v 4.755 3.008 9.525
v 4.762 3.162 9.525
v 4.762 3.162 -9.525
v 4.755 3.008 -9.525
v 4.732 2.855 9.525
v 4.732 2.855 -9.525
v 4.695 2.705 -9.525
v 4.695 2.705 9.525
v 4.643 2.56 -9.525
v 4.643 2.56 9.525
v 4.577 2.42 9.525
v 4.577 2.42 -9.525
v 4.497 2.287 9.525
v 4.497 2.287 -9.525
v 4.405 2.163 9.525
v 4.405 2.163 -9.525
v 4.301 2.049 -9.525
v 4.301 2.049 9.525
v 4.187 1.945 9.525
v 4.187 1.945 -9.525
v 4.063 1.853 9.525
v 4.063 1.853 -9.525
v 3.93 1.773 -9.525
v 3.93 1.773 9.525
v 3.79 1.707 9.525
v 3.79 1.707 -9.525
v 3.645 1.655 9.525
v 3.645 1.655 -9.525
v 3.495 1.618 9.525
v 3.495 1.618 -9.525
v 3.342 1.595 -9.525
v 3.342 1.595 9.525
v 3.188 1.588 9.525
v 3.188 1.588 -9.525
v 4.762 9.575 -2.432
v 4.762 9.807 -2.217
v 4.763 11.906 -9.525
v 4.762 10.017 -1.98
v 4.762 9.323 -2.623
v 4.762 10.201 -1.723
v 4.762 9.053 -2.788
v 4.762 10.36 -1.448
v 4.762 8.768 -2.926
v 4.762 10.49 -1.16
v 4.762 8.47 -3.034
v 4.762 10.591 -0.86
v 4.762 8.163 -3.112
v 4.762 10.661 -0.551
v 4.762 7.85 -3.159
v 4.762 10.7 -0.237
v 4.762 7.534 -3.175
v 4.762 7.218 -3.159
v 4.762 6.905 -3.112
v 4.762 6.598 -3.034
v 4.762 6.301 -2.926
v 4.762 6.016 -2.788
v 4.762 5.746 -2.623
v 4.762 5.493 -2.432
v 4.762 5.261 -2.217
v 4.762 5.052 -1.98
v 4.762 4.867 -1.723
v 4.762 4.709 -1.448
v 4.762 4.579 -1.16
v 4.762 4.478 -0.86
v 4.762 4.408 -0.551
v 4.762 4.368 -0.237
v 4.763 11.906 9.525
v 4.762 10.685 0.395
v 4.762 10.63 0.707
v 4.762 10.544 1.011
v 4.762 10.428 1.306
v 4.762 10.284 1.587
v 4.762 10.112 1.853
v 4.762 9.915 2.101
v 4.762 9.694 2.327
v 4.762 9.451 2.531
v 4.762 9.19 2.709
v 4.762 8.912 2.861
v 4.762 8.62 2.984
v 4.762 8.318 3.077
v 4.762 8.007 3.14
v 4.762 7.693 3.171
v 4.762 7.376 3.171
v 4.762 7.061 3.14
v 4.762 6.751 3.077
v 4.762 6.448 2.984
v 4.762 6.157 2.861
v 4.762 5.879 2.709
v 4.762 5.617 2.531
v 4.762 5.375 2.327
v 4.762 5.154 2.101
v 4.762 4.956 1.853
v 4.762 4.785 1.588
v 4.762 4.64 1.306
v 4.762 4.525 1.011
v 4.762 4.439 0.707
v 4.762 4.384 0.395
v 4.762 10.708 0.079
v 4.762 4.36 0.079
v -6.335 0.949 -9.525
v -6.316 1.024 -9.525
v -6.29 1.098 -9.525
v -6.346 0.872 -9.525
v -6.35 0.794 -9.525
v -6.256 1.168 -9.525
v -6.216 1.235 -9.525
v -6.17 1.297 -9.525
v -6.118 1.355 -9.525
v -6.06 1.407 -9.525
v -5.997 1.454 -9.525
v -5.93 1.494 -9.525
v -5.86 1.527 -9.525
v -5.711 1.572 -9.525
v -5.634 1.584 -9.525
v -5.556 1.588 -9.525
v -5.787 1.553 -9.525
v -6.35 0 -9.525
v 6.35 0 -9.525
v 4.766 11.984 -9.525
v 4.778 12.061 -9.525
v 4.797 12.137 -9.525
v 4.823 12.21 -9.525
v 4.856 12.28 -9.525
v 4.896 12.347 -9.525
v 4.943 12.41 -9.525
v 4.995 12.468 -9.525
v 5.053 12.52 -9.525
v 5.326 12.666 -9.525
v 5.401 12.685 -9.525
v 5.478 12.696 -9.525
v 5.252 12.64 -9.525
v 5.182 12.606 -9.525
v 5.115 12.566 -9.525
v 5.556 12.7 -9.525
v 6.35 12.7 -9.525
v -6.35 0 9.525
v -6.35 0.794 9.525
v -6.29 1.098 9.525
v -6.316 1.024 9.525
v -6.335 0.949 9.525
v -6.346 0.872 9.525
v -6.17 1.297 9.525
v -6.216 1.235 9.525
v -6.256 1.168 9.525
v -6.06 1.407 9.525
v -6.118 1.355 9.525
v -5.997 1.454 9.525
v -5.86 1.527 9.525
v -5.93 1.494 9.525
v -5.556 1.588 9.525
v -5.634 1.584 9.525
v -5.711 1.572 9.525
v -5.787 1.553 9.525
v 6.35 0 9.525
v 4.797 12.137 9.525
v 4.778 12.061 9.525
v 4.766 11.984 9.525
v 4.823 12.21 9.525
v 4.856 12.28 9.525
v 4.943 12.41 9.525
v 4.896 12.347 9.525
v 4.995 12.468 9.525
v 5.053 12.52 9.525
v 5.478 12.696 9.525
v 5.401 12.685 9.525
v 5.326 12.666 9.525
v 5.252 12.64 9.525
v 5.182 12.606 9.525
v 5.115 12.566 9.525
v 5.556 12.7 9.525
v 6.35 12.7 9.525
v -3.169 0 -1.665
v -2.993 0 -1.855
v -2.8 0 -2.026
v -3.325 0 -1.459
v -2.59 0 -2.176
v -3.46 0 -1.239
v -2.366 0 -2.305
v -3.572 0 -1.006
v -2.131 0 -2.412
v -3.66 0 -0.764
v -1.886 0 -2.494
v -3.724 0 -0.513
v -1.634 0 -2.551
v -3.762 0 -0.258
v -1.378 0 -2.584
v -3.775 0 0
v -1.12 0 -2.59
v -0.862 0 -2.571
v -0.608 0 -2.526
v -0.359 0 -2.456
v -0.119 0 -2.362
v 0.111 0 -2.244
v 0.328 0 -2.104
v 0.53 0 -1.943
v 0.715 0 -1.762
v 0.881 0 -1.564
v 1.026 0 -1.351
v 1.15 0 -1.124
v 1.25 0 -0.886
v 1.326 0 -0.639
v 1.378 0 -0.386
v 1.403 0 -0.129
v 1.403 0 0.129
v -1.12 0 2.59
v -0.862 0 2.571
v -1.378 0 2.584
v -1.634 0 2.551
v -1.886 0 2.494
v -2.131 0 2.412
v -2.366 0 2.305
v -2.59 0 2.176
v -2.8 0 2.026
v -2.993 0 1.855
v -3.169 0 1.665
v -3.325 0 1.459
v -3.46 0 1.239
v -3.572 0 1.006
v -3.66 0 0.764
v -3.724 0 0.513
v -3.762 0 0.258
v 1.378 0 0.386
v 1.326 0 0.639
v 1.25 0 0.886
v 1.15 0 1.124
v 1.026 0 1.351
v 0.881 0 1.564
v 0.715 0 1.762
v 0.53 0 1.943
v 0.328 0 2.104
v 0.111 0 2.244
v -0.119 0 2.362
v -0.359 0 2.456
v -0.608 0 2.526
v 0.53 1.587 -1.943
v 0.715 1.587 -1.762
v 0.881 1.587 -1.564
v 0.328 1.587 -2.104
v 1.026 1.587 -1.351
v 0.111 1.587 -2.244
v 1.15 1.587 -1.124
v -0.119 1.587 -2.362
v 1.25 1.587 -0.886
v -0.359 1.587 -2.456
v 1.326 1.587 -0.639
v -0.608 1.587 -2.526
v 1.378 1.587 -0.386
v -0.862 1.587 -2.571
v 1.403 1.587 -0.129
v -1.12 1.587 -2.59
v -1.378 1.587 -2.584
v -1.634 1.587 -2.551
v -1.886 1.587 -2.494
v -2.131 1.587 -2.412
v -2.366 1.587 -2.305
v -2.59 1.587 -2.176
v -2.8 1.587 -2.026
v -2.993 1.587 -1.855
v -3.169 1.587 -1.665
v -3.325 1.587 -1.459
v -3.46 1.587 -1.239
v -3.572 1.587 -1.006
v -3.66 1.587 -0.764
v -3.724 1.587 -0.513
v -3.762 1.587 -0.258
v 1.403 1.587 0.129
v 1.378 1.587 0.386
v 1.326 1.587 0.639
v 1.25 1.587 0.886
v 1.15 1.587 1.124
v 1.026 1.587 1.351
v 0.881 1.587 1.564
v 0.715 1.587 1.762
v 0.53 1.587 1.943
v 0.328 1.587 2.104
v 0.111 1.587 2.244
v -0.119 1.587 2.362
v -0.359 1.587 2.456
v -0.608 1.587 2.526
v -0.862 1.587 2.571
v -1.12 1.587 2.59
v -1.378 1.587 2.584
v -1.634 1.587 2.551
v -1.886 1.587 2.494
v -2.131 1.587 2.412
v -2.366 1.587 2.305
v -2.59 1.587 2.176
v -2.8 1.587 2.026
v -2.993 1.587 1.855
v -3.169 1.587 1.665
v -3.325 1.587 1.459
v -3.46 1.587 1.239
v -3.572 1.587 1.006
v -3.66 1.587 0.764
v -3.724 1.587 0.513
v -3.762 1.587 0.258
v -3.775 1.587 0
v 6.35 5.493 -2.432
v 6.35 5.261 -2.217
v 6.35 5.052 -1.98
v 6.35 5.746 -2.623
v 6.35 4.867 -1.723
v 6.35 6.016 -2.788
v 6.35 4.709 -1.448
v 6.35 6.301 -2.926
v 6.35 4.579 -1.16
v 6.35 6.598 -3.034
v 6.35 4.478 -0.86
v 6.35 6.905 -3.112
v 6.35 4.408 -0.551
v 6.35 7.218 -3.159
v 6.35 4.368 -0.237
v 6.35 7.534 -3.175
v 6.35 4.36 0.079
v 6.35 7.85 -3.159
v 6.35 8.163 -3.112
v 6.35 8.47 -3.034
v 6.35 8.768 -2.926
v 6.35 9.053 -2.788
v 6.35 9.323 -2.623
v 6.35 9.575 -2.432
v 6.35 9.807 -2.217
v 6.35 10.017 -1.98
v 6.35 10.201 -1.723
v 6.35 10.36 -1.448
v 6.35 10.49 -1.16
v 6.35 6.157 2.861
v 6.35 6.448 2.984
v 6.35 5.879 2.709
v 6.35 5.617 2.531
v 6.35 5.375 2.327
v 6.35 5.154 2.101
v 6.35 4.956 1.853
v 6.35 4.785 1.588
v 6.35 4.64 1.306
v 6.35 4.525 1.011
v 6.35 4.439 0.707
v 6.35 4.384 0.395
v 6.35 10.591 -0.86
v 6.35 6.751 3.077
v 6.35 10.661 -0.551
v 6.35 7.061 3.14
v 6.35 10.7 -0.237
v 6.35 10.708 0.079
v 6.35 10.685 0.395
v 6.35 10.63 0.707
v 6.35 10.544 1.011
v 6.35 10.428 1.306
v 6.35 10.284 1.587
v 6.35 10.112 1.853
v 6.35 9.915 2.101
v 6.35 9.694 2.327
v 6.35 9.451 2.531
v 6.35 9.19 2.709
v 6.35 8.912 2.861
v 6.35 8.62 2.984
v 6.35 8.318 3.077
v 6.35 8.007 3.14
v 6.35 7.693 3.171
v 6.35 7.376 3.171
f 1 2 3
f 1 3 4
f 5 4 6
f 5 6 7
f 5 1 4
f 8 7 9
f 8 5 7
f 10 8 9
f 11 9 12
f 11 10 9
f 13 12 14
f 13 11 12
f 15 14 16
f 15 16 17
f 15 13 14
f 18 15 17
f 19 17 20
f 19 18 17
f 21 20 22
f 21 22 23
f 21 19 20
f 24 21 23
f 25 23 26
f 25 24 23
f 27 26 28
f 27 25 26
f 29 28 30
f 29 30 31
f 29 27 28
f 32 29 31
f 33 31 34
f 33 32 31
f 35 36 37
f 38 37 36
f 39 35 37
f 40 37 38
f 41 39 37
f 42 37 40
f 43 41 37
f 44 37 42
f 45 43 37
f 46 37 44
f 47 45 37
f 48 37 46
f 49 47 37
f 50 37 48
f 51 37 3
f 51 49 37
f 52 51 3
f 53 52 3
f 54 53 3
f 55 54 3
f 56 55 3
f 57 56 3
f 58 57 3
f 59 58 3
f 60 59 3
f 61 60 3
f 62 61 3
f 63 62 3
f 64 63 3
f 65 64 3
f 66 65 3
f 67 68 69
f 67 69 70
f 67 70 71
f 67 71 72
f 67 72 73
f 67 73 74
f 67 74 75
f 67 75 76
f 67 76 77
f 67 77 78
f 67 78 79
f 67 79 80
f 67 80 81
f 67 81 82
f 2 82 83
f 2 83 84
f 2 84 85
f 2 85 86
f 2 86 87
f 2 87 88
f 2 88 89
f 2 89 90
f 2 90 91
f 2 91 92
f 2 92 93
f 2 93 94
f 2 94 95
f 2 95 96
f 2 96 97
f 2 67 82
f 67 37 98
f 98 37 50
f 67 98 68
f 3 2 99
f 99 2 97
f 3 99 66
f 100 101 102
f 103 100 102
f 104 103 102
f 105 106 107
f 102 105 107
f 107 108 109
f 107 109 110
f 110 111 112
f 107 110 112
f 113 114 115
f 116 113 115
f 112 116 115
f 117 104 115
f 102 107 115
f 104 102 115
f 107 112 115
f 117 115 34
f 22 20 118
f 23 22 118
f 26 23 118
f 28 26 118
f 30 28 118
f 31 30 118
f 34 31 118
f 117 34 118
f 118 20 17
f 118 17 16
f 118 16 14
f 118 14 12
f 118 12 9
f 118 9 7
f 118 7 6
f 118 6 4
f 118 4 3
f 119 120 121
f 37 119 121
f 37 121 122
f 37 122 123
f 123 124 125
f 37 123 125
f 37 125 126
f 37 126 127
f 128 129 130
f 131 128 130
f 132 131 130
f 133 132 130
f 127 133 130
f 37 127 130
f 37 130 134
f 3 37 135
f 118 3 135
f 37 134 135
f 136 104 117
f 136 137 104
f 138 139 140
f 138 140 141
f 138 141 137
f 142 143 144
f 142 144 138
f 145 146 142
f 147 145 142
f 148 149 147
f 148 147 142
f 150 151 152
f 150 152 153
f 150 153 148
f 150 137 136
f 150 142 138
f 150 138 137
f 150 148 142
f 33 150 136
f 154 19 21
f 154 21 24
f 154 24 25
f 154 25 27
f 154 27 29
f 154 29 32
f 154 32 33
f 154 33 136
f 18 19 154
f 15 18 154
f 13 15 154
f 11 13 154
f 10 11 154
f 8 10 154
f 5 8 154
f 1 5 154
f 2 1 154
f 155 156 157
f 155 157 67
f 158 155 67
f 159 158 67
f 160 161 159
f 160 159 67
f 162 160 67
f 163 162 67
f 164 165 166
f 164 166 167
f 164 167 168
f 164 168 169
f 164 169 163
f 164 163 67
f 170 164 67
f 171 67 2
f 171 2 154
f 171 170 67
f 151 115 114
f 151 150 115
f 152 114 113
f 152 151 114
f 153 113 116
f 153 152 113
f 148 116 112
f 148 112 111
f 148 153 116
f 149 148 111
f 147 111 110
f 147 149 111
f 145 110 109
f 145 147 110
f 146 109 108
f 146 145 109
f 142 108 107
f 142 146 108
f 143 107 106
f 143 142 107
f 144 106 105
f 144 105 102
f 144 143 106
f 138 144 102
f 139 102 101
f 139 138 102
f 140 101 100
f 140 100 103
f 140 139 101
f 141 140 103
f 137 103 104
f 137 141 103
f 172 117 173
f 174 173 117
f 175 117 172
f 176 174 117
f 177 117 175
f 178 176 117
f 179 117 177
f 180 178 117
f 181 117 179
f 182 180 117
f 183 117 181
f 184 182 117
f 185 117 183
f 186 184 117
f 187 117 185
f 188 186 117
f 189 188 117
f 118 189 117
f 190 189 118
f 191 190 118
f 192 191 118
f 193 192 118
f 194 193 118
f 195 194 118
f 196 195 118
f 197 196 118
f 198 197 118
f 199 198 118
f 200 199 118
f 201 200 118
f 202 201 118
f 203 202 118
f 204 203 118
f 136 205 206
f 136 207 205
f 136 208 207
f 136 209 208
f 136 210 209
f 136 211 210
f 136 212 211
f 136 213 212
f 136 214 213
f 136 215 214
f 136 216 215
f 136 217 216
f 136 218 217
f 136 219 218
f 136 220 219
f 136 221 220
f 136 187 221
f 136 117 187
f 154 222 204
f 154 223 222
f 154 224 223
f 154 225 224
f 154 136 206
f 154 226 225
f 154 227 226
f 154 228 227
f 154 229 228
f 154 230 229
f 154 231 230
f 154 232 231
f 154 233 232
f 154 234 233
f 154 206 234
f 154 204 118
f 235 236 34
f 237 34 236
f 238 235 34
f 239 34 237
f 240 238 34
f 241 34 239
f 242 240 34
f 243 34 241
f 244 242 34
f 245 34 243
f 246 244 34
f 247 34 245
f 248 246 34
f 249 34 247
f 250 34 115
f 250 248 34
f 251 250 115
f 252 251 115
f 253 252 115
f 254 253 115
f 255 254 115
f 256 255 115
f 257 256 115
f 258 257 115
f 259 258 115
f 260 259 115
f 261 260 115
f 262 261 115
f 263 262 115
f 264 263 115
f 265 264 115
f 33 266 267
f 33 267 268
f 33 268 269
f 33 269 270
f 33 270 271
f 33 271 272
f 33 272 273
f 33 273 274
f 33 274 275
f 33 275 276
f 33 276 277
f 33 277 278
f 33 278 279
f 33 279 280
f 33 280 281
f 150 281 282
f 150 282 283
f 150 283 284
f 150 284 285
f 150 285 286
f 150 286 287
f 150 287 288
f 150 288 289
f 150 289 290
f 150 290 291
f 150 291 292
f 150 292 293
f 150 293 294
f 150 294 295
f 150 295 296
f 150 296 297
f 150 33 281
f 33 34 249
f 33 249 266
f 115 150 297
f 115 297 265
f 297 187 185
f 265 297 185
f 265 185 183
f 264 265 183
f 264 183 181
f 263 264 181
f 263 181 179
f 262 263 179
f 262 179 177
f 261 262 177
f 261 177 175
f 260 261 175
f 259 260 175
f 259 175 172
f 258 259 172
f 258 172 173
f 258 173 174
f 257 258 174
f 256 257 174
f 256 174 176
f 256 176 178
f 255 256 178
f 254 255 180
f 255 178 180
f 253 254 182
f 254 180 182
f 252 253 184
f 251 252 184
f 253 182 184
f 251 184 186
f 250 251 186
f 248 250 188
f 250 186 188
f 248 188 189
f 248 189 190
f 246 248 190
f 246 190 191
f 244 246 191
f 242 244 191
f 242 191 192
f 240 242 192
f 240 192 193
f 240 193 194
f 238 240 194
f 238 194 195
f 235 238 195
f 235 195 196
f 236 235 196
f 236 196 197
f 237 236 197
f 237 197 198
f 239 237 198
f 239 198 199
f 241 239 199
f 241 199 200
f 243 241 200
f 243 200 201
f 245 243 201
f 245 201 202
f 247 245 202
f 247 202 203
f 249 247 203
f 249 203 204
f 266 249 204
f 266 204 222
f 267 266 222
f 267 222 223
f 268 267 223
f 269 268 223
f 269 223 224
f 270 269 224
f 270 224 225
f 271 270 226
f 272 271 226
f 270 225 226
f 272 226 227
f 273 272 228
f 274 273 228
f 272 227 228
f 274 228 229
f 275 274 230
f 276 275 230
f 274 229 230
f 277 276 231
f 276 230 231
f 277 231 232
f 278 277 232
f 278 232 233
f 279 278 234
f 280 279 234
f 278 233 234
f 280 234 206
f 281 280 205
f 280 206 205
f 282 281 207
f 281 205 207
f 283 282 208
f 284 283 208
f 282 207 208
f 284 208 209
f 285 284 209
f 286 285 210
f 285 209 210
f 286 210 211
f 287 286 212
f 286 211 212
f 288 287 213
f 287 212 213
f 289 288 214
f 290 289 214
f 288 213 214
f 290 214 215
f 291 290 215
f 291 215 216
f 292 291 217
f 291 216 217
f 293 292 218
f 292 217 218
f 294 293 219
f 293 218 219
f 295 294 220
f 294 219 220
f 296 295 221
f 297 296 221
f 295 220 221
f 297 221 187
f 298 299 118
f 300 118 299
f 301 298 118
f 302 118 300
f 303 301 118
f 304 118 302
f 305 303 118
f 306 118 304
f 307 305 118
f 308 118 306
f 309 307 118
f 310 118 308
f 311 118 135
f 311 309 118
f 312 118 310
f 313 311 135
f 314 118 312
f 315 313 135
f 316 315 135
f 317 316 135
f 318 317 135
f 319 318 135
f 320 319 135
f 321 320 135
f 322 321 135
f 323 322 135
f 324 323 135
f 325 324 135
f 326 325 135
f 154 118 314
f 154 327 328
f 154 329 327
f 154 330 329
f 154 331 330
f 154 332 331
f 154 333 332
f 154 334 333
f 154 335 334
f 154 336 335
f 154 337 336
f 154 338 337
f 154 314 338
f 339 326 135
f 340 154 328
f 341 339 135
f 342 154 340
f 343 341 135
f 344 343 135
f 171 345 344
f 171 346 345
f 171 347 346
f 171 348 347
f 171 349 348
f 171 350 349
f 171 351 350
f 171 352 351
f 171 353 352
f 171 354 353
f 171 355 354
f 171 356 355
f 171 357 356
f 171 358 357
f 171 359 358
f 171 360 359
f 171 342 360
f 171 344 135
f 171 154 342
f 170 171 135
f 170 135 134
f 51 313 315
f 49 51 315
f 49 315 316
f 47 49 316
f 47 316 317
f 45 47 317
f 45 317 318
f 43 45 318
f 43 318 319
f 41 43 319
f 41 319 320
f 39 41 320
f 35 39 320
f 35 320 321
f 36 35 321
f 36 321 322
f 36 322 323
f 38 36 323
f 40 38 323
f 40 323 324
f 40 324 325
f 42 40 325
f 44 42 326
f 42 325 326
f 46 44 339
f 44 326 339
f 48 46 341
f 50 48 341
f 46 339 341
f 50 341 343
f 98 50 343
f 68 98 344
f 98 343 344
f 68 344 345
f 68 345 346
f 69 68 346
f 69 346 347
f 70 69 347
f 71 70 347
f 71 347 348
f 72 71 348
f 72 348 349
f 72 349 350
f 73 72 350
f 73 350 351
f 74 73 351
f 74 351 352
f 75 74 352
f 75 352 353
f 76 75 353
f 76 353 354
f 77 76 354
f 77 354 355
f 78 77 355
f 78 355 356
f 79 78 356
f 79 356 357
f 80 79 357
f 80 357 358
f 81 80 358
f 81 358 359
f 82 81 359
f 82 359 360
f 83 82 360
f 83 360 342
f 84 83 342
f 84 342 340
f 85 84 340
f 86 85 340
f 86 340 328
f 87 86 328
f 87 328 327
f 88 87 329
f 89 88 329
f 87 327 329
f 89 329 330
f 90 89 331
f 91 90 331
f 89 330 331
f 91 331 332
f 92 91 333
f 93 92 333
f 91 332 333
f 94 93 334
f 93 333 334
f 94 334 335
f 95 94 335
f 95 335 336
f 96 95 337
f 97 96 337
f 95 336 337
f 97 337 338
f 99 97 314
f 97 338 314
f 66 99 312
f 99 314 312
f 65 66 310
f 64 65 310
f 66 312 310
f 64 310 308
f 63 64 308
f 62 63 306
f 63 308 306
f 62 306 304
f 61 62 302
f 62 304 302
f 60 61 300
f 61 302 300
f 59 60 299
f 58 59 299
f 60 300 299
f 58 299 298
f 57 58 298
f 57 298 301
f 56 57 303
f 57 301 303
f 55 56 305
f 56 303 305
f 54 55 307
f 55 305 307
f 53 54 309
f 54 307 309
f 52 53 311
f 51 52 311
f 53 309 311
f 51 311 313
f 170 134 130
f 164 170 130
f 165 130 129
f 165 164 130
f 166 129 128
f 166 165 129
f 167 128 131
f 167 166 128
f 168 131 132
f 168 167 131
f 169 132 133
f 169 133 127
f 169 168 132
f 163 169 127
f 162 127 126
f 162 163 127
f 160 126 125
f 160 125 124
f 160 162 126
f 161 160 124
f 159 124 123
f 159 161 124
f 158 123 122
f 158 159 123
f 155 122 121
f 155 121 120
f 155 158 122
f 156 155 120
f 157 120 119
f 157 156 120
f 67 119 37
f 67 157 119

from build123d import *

# Parameters (mm, degrees)
BOSS_EXTRUDE1_DEPTH         = 9.525
F_6_0_204_DIAMETER_HOLE1_D  = 5.1816
F_1_4_0_25_DIAMETER_HOLE1_D = 6.35


with BuildPart() as part:
    # Sketch2 → Boss-Extrude1 (new, symmetric)
    with BuildSketch(Plane.XY):
        with BuildLine():
            Line((-6.35, 0), (6.35, 0))
            Line((6.35, 0), (6.35, 12.7))
            Line((6.35, 12.7), (5.55625, 12.7))
            ThreePointArc((5.55625, 12.7), (4.994983992, 12.467516008), (4.7625, 11.90625))
            Line((4.7625, 11.90625), (4.7625, 3.1623))
            ThreePointArc((4.7625, 3.1623), (4.301251759, 2.048748241), (3.1877, 1.5875))
            Line((3.1877, 1.5875), (-5.55625, 1.5875))
            ThreePointArc((-5.55625, 1.5875), (-6.117516008, 1.355016008), (-6.35, 0.79375))
            Line((-6.35, 0.79375), (-6.35, 0))
        make_face()
    extrude(amount=BOSS_EXTRUDE1_DEPTH, both=True)

    # #6 (0.204) Diameter Hole1 (through all)
    with Locations(Plane(origin=(0, 1.5875, 0), x_dir=(1, 0, 0), z_dir=(0, 1, 0))):
        with Locations((-1.184275, 0)):
            Hole(F_6_0_204_DIAMETER_HOLE1_D / 2)

    # 1/4 (0.25) Diameter Hole1 (through all)
    with Locations(Plane.ZY.offset(-4.7625)):
        with Locations((0, 7.534275)):
            Hole(F_1_4_0_25_DIAMETER_HOLE1_D / 2)


solid = part.part
